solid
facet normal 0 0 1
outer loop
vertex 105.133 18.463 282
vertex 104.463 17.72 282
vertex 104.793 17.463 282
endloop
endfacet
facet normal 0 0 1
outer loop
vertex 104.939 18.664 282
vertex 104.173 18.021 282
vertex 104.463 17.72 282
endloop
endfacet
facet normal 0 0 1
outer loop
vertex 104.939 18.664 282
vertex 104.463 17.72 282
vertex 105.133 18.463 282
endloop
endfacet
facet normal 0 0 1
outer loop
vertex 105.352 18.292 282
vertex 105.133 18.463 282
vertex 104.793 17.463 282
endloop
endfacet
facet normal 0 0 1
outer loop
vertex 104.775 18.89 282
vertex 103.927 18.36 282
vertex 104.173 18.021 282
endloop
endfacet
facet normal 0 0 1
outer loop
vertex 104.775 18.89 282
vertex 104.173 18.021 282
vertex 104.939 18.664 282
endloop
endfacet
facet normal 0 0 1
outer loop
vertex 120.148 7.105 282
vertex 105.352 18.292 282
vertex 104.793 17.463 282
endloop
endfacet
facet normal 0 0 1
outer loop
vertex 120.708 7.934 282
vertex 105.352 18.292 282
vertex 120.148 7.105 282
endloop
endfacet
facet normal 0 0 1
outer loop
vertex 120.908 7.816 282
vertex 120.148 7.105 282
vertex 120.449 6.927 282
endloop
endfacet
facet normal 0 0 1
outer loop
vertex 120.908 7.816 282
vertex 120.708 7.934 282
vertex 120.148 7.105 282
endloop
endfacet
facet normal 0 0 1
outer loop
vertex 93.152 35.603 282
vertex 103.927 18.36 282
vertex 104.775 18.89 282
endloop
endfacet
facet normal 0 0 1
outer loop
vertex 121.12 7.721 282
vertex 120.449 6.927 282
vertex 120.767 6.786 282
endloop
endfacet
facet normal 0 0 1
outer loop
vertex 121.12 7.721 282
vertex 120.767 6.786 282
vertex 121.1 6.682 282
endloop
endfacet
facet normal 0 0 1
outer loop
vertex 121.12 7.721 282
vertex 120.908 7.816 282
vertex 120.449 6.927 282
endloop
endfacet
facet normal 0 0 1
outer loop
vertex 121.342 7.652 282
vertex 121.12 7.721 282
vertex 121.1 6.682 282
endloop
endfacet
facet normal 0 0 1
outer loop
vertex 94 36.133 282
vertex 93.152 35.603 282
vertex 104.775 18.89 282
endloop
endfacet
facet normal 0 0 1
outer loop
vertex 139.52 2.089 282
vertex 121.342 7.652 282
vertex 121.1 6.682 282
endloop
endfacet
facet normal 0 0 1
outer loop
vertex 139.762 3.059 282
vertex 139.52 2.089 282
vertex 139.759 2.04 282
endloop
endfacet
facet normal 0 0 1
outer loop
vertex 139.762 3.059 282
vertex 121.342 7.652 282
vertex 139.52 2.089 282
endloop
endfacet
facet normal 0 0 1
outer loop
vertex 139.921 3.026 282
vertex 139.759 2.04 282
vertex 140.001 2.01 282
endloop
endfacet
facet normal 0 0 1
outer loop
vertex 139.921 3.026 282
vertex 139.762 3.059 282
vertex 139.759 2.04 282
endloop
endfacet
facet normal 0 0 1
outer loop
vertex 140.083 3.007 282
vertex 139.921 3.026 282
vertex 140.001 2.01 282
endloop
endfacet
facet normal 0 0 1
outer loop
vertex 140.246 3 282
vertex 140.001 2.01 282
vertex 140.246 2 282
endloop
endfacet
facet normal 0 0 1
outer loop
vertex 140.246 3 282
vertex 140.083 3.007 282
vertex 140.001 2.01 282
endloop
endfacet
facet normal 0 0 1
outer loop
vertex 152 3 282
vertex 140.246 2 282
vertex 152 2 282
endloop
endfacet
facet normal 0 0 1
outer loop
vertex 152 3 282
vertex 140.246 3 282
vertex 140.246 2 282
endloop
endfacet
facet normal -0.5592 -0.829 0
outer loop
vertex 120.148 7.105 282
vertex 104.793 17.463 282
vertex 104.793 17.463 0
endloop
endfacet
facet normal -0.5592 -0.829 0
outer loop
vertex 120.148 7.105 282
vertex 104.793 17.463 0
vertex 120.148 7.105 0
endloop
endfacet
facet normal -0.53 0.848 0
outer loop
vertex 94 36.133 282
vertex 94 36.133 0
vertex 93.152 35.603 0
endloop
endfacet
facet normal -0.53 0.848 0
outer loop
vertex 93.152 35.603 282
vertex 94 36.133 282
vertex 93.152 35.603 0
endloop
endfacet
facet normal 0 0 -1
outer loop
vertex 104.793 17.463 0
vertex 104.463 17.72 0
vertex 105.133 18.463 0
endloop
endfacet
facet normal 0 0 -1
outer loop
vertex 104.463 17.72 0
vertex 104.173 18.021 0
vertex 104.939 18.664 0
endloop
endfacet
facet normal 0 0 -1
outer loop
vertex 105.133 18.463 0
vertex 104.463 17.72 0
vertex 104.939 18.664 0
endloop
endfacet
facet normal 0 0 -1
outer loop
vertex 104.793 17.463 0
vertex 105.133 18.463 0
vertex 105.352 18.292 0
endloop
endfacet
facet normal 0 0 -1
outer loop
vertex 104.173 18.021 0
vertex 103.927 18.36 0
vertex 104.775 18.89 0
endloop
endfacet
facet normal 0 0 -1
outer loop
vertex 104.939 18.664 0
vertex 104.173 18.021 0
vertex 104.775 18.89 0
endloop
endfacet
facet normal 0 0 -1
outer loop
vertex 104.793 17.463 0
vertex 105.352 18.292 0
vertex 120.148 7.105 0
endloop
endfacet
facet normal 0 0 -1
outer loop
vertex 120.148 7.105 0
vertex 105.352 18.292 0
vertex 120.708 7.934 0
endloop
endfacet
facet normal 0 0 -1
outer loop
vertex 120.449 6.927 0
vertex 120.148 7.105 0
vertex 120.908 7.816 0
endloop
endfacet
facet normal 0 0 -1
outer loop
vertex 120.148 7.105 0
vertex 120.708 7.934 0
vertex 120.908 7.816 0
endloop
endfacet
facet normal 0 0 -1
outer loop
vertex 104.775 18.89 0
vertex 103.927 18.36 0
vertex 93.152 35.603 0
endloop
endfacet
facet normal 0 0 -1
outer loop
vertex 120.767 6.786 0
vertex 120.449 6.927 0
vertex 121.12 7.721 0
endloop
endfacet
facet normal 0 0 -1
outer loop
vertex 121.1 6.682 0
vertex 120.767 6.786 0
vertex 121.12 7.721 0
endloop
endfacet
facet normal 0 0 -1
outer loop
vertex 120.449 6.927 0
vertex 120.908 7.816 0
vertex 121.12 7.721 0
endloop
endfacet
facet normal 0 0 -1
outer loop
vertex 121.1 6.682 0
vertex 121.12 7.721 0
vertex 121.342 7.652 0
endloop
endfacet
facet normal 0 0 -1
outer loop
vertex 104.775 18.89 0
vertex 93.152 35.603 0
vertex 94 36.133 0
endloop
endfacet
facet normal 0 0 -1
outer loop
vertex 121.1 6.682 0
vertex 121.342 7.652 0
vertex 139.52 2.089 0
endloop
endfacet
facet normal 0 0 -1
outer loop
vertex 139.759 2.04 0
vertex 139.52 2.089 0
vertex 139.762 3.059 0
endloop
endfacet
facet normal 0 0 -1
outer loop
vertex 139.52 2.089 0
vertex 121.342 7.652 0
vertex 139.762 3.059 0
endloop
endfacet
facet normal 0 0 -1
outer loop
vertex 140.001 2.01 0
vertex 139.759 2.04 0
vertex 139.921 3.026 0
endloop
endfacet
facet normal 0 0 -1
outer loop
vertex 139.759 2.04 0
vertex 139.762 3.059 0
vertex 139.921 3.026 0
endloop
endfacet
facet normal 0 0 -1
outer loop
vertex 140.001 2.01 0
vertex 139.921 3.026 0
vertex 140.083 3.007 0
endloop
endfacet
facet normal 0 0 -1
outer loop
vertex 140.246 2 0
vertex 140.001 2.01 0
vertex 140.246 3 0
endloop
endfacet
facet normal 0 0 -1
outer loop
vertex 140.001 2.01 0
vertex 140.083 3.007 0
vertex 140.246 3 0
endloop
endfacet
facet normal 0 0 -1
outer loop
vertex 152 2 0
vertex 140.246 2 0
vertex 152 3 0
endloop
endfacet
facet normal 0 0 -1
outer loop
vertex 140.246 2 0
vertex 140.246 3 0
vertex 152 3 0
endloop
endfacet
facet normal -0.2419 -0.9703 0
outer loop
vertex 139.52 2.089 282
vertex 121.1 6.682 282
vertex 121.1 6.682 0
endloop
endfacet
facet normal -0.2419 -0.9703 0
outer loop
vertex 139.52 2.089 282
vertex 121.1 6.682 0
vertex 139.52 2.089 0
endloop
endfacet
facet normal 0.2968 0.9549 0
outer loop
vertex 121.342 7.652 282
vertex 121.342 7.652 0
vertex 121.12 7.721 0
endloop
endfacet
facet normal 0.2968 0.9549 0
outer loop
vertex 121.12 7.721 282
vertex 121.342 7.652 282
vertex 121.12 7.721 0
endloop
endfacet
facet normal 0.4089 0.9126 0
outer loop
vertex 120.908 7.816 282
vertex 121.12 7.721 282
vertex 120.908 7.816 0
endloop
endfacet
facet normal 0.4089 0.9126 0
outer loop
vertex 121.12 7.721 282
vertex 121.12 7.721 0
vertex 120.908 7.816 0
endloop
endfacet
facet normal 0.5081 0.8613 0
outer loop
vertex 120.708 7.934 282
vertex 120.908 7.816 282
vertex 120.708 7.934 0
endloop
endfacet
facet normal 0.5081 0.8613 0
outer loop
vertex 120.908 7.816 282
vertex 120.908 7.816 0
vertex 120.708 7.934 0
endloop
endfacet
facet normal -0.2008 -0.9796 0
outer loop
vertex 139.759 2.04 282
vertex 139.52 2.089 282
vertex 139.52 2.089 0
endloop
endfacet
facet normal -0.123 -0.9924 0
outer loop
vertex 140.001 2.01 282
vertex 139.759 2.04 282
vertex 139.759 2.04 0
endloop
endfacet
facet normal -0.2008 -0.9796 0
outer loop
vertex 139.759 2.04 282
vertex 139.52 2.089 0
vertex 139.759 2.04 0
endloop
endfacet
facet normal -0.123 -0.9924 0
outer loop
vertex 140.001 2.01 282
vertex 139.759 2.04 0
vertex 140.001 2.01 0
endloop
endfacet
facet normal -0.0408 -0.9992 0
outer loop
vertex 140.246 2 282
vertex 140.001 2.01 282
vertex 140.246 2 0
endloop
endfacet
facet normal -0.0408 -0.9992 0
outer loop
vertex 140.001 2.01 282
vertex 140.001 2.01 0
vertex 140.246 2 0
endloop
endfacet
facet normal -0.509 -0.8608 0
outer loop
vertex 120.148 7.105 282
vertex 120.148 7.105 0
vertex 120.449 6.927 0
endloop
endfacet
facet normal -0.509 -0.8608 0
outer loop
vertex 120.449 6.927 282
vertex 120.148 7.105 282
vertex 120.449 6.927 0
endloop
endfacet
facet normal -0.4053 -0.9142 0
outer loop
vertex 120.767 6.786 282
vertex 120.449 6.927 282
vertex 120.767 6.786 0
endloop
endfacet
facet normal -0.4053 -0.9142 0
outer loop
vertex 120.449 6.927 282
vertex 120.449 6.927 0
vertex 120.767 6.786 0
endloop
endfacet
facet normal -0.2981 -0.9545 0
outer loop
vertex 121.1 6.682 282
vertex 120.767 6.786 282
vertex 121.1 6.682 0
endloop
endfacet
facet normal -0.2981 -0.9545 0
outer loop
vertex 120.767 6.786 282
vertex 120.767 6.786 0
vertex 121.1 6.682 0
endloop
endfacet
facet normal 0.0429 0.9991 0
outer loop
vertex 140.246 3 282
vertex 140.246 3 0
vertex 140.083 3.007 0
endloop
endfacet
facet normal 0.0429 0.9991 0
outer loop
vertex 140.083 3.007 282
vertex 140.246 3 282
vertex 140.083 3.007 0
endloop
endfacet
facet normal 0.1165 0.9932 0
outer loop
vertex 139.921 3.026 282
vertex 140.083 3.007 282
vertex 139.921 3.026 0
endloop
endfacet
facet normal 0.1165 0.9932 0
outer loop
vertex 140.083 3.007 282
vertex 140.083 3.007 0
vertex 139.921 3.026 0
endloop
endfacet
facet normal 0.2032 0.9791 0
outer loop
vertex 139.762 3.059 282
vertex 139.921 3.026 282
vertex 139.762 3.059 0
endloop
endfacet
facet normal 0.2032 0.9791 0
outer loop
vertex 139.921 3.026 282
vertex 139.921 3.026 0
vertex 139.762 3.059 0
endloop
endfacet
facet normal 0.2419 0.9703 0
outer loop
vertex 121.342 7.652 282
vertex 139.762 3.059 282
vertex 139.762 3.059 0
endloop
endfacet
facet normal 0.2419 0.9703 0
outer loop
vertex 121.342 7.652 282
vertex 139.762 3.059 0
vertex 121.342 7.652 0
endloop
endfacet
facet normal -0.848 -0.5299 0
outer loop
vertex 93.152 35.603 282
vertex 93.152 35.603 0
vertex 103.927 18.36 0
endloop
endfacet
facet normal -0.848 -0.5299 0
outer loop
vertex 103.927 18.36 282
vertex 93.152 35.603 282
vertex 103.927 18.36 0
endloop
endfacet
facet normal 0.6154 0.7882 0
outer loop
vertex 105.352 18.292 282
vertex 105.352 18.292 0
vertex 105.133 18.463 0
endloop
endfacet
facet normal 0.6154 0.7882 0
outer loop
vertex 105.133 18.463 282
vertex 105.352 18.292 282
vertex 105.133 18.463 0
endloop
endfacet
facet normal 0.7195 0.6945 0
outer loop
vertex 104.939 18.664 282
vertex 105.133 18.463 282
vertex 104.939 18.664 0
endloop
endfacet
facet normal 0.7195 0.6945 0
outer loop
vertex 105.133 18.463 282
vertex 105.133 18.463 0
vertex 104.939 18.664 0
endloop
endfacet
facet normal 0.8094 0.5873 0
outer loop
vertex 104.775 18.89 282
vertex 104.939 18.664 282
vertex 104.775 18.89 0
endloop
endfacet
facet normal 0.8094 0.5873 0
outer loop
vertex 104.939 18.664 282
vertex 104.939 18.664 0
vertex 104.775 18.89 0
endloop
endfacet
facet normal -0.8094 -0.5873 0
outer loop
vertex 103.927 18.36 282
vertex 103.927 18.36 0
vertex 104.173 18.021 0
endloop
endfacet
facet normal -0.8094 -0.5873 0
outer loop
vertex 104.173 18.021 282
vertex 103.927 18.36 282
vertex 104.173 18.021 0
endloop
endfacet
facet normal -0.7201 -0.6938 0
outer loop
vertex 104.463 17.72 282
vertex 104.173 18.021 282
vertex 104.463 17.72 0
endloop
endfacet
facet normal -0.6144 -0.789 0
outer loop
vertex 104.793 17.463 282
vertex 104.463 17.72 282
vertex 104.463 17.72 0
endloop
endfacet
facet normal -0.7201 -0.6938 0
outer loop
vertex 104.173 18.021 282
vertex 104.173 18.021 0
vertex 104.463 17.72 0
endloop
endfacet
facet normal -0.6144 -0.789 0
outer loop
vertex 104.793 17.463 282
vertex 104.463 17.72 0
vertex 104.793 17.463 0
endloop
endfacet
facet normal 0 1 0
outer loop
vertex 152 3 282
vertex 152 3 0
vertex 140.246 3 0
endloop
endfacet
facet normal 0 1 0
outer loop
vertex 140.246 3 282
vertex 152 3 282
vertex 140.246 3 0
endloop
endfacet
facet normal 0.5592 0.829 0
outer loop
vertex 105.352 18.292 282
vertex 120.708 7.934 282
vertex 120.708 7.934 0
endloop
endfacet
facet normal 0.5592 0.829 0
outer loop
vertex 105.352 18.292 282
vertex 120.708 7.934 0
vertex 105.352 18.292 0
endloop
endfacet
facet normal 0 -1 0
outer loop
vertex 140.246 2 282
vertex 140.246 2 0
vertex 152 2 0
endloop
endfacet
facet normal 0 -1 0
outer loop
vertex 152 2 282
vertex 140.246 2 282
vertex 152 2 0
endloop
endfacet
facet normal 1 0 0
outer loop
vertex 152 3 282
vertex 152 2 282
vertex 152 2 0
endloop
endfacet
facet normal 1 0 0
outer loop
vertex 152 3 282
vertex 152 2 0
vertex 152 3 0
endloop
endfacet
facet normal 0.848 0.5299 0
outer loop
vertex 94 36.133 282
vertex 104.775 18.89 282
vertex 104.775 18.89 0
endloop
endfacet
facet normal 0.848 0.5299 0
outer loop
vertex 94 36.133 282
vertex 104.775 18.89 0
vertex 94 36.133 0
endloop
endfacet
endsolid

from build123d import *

# Parameters (mm, degrees)
CONTINUOUS_OUTER_IMPACT_SKIN_DEPTH = 282


with BuildPart() as part:
    # Continuous outer impact skin profile → Continuous outer impact skin (new body)
    with BuildSketch(Plane.XY):
        with BuildLine():
            Line((152, 3), (140.245569122, 3))
            ThreePointArc((140.245569122, 3), (140.001830435, 3.014907697), (139.761725331, 3.059408547))
            Line((139.761725331, 3.059408547), (121.342178632, 7.651917339))
            ThreePointArc((121.342178632, 7.651917339), (121.012549136, 7.765417876), (120.707636616, 7.934433647))
            Line((120.707636616, 7.934433647), (105.352434752, 18.291648082))
            ThreePointArc((105.352434752, 18.291648082), (105.032140958, 18.560406486), (104.774724366, 18.889884698))
            Line((104.774724366, 18.889884698), (94, 36.133048143))
            Line((94, 36.133048143), (93.151951903, 35.603128878))
            Line((93.151951903, 35.603128878), (103.926676269, 18.359965433))
            ThreePointArc((103.926676269, 18.359965433), (104.312801157, 17.865748115), (104.793241848, 17.462610509))
            Line((104.793241848, 17.462610509), (120.148443712, 7.105396074))
            ThreePointArc((120.148443712, 7.105396074), (120.605812493, 6.851872418), (121.100256736, 6.681621612))
            Line((121.100256736, 6.681621612), (139.519803435, 2.08911282))
            ThreePointArc((139.519803435, 2.08911282), (139.879961091, 2.022361545), (140.245569122, 1.999999999))
            Line((140.245569122, 1.999999999), (152, 1.999999999))
            Line((152, 1.999999999), (152, 3))
        make_face()
    extrude(amount=CONTINUOUS_OUTER_IMPACT_SKIN_DEPTH)


solid = part.part
